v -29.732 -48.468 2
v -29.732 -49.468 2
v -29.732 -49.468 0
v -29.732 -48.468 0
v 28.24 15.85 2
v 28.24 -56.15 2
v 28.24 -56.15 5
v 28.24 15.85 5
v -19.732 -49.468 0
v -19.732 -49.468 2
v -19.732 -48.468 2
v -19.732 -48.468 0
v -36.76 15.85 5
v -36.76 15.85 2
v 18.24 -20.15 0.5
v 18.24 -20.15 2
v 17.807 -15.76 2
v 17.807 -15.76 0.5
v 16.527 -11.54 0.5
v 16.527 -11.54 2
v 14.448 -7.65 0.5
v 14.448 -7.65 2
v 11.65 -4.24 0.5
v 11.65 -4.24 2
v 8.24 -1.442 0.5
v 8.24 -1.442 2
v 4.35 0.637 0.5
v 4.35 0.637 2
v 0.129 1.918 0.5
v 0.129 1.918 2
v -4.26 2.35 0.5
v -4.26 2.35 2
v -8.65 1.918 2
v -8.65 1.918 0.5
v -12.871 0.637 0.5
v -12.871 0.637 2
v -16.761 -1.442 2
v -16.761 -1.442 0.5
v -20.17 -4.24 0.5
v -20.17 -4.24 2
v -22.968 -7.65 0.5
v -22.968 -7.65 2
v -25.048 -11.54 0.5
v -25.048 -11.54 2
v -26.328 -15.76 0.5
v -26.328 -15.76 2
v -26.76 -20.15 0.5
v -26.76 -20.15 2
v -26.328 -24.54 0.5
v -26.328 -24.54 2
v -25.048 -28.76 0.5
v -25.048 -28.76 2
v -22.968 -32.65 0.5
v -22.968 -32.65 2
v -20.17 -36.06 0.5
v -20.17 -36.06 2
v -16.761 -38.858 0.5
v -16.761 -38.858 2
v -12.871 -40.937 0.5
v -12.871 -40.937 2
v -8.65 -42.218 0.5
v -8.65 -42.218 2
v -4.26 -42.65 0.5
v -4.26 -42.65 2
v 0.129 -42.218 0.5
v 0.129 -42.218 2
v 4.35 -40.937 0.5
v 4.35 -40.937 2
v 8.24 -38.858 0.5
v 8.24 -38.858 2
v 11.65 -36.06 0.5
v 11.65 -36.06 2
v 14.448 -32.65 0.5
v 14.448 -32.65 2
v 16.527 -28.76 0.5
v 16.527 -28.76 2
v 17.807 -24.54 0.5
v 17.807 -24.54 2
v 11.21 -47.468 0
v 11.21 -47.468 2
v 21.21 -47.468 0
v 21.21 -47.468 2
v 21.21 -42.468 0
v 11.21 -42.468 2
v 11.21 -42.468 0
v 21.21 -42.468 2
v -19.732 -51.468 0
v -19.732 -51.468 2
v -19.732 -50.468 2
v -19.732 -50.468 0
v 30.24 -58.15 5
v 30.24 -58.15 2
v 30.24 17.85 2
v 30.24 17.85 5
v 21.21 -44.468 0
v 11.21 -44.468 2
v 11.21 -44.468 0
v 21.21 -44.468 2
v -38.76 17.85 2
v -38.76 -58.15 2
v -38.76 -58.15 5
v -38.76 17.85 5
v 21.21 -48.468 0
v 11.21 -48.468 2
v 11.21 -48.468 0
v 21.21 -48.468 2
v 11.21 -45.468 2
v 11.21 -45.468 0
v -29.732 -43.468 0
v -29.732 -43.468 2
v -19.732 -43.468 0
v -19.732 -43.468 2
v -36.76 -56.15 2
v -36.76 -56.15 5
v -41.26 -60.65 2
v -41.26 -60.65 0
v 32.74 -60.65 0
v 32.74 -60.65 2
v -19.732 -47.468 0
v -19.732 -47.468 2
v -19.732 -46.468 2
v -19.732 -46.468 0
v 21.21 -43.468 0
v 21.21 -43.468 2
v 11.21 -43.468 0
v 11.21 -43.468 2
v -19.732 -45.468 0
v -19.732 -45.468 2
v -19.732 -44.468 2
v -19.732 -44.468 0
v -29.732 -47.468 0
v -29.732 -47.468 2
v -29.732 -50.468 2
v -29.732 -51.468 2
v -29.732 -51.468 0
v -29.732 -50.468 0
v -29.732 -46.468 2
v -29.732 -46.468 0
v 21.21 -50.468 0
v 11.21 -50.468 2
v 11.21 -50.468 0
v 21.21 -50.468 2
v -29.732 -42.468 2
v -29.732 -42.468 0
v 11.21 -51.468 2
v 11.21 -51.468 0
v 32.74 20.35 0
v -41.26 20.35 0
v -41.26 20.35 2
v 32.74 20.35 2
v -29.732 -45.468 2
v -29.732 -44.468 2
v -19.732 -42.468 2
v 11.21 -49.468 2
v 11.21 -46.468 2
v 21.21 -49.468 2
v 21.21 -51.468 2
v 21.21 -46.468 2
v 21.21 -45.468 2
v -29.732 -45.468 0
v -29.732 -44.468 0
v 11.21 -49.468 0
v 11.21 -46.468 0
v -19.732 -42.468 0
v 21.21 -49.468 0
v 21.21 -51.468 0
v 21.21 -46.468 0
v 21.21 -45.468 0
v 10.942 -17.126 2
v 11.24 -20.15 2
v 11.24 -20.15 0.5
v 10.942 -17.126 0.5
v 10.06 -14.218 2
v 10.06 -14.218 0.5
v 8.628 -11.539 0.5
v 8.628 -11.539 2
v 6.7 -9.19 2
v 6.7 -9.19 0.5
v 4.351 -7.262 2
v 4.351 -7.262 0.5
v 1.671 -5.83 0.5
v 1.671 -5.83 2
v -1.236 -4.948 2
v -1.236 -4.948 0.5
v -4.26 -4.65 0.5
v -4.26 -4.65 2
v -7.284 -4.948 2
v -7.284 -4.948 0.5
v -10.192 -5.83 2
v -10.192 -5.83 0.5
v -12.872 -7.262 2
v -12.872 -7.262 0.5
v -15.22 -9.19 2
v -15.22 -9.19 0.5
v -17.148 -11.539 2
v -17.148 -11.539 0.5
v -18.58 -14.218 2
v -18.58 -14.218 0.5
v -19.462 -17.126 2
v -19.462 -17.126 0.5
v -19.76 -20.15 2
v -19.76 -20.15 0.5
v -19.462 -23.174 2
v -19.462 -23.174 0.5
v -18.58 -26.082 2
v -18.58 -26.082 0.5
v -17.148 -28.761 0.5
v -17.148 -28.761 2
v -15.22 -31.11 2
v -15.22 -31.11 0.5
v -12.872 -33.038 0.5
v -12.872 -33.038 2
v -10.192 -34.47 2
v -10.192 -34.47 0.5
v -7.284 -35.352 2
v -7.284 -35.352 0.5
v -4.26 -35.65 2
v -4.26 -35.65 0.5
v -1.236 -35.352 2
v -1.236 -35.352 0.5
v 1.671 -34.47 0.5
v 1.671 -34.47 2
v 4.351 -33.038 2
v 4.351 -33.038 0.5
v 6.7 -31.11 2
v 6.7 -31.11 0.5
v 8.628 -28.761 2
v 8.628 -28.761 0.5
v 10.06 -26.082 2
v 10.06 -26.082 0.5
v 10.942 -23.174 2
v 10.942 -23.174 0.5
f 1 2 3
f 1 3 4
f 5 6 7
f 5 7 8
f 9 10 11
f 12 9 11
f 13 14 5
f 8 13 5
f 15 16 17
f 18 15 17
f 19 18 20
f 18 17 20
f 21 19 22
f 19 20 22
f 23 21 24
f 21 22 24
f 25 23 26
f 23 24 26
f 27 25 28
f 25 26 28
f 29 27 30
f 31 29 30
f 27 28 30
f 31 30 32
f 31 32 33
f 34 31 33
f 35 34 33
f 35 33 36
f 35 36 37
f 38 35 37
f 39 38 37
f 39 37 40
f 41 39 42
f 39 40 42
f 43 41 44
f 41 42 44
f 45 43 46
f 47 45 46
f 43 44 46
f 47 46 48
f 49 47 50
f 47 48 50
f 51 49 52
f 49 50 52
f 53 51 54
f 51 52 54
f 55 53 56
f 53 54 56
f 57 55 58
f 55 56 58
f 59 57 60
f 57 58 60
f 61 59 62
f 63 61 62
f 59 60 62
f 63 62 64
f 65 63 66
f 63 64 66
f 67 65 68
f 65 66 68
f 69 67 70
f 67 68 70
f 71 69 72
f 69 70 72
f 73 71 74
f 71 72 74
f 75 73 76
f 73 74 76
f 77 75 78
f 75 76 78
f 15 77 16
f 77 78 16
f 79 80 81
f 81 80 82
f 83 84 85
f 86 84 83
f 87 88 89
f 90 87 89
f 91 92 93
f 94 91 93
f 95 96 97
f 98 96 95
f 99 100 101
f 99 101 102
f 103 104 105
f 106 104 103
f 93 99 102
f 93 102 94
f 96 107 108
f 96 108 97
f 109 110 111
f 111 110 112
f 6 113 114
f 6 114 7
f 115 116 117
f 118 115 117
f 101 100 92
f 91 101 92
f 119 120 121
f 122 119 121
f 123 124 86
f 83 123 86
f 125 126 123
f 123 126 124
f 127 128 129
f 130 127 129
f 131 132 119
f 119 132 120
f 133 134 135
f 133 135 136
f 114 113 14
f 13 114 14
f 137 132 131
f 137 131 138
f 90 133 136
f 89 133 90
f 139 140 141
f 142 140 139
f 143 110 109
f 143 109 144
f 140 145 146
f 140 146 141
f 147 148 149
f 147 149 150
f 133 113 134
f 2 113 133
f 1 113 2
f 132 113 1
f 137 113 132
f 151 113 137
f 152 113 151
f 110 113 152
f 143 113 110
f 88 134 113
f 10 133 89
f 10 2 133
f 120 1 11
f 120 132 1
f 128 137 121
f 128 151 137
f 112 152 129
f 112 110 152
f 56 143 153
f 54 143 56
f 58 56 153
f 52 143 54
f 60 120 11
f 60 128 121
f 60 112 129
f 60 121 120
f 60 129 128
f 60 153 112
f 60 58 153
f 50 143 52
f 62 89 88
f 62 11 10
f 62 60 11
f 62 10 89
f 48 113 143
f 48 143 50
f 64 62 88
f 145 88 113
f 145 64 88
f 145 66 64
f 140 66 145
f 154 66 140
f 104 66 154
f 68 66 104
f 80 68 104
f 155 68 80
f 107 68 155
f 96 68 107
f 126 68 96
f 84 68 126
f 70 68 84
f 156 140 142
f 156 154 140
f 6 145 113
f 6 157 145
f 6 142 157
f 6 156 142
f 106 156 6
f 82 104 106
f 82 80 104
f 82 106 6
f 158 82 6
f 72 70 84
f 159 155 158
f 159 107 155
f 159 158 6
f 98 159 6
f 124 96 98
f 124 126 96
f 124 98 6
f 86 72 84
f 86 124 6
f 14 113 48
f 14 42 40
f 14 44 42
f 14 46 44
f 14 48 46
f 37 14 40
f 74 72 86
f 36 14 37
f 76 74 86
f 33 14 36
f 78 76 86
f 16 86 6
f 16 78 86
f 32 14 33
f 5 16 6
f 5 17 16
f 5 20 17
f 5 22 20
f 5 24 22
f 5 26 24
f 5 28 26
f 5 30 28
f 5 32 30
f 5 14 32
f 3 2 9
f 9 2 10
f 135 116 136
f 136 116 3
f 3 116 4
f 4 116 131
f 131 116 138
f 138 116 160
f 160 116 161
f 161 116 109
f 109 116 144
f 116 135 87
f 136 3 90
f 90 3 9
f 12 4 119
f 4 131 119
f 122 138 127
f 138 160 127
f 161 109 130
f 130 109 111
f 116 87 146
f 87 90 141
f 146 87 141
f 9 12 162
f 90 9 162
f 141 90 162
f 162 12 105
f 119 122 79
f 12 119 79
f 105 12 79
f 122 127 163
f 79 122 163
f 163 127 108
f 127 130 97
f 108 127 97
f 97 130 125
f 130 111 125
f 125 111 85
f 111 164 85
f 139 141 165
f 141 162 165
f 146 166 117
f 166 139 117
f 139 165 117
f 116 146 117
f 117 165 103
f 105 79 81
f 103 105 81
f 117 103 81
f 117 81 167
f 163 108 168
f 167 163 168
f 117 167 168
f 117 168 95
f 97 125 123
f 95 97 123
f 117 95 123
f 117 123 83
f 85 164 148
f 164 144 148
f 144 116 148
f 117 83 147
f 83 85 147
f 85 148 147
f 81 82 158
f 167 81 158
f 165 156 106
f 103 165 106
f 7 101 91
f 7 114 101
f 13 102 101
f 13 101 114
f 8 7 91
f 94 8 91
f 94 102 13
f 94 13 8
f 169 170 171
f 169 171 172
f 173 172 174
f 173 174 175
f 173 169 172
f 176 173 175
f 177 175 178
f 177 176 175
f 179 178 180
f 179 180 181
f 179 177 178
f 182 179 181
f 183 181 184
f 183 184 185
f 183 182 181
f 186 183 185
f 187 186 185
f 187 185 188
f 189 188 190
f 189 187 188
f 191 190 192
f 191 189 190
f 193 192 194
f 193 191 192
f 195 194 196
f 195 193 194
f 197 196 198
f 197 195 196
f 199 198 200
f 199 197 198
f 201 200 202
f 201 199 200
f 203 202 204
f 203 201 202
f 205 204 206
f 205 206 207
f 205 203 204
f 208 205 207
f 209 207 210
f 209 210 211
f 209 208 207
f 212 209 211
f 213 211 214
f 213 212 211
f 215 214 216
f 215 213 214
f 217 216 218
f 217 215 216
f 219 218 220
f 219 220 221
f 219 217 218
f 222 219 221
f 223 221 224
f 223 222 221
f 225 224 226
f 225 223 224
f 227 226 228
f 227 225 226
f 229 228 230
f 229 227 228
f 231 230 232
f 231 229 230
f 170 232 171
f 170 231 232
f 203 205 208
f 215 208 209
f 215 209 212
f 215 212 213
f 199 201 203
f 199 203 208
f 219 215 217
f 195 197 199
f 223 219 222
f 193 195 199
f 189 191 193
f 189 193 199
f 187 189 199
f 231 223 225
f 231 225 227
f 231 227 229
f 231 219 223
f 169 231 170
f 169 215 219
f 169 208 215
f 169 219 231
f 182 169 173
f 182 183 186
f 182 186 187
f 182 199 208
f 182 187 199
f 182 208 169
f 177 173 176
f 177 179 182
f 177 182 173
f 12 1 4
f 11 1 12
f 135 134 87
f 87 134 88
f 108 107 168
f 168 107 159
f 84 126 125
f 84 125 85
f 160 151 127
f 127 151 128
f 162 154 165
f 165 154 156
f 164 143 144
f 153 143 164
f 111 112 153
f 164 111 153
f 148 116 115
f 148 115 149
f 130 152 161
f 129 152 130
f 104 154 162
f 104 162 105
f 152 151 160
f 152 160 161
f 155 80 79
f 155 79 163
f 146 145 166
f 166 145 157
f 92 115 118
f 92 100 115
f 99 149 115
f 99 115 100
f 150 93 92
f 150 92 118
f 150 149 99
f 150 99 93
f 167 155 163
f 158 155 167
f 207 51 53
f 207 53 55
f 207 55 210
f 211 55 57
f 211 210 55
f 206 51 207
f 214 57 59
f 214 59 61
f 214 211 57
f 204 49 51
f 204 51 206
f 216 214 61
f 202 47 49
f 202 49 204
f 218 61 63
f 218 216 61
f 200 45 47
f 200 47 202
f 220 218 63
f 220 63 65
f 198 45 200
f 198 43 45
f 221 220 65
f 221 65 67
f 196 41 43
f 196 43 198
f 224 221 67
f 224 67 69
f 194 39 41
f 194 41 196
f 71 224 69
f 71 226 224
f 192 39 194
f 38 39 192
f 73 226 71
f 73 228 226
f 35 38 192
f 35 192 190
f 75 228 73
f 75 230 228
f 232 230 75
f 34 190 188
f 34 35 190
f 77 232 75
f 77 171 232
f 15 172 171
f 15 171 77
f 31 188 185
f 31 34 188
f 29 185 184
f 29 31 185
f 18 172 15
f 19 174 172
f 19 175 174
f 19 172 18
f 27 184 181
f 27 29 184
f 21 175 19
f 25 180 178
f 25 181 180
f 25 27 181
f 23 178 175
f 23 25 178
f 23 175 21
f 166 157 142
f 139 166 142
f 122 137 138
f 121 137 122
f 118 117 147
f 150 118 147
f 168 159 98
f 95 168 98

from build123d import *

# Parameters (mm, degrees)
SKIZZE1_W                       = 74
SKIZZE1_H                       = 81
AUFSATZ_LINEAR_AUSTRAGEN1_DEPTH = 2
SKIZZE2_W                       = 69
SKIZZE2_H                       = 76
SKIZZE2_W_2                     = 65
SKIZZE2_H_2                     = 72
AUFSATZ_LINEAR_AUSTRAGEN2_DEPTH = 3
SKIZZE3_R                       = 22.5
SKIZZE3_R_2                     = 15.5
SCHNITT_LINEAR_AUSTRAGEN3_DEPTH = 1.5
SKIZZE4_W                       = 10
SKIZZE4_H                       = 1
SCHNITT_LINEAR_AUSTRAGEN4_DEPTH = 3
SKIZZE5_W                       = 10
SKIZZE5_H                       = 1
SCHNITT_LINEAR_AUSTRAGEN5_DEPTH = 3


with BuildPart() as part:
    # Skizze1 → Aufsatz-Linear austragen1 (new body)
    with BuildSketch(Plane.XY):
        with Locations((-4.260212221, -20.15)):
            Rectangle(SKIZZE1_W, SKIZZE1_H)
    extrude(amount=AUFSATZ_LINEAR_AUSTRAGEN1_DEPTH)

    # Skizze2 → Aufsatz-Linear austragen2 (add)
    with BuildSketch(Plane.XY.offset(2)):
        with Locations((-4.260212221, -20.15)):
            Rectangle(SKIZZE2_W, SKIZZE2_H)
        with Locations((-4.260212221, -20.15)):
            Rectangle(SKIZZE2_W_2, SKIZZE2_H_2, mode=Mode.SUBTRACT)
    extrude(amount=AUFSATZ_LINEAR_AUSTRAGEN2_DEPTH)

    # Skizze3 → Schnitt-Linear austragen3 (cut)
    with BuildSketch(Plane.XY.offset(2)):
        with Locations((-4.260212221, -20.15)):
            Circle(SKIZZE3_R)
        with Locations((-4.260212221, -20.15)):
            Circle(SKIZZE3_R_2, mode=Mode.SUBTRACT)
    extrude(amount=-SCHNITT_LINEAR_AUSTRAGEN3_DEPTH, mode=Mode.SUBTRACT)

    # Skizze4 → Schnitt-Linear austragen4 (cut, through all)
    with BuildSketch(Plane.XY.offset(2)):
        with Locations((-24.731661751, -48.968325553)):
            Rectangle(SKIZZE4_W, SKIZZE4_H)
        with Locations((-24.731661751, -50.968325553)):
            Rectangle(SKIZZE4_W, SKIZZE4_H)
        with Locations((-24.731661751, -46.968325553)):
            Rectangle(SKIZZE4_W, SKIZZE4_H)
        with Locations((-24.731661751, -44.968325553)):
            Rectangle(SKIZZE4_W, SKIZZE4_H)
        with Locations((-24.731661751, -42.968325553)):
            Rectangle(SKIZZE4_W, SKIZZE4_H)
    extrude(amount=-SCHNITT_LINEAR_AUSTRAGEN4_DEPTH, mode=Mode.SUBTRACT)

    # Skizze5 → Schnitt-Linear austragen5 (cut, through all)
    with BuildSketch(Plane.XY.offset(2)):
        with Locations((16.209787779, -50.968325553)):
            Rectangle(SKIZZE5_W, SKIZZE5_H)
        with Locations((16.209787779, -48.968325553)):
            Rectangle(SKIZZE5_W, SKIZZE5_H)
        with Locations((16.209787779, -46.968325553)):
            Rectangle(SKIZZE5_W, SKIZZE5_H)
        with Locations((16.209787779, -44.968325553)):
            Rectangle(SKIZZE5_W, SKIZZE5_H)
        with Locations((16.209787779, -42.968325553)):
            Rectangle(SKIZZE5_W, SKIZZE5_H)
    extrude(amount=-SCHNITT_LINEAR_AUSTRAGEN5_DEPTH, mode=Mode.SUBTRACT)


solid = part.part
